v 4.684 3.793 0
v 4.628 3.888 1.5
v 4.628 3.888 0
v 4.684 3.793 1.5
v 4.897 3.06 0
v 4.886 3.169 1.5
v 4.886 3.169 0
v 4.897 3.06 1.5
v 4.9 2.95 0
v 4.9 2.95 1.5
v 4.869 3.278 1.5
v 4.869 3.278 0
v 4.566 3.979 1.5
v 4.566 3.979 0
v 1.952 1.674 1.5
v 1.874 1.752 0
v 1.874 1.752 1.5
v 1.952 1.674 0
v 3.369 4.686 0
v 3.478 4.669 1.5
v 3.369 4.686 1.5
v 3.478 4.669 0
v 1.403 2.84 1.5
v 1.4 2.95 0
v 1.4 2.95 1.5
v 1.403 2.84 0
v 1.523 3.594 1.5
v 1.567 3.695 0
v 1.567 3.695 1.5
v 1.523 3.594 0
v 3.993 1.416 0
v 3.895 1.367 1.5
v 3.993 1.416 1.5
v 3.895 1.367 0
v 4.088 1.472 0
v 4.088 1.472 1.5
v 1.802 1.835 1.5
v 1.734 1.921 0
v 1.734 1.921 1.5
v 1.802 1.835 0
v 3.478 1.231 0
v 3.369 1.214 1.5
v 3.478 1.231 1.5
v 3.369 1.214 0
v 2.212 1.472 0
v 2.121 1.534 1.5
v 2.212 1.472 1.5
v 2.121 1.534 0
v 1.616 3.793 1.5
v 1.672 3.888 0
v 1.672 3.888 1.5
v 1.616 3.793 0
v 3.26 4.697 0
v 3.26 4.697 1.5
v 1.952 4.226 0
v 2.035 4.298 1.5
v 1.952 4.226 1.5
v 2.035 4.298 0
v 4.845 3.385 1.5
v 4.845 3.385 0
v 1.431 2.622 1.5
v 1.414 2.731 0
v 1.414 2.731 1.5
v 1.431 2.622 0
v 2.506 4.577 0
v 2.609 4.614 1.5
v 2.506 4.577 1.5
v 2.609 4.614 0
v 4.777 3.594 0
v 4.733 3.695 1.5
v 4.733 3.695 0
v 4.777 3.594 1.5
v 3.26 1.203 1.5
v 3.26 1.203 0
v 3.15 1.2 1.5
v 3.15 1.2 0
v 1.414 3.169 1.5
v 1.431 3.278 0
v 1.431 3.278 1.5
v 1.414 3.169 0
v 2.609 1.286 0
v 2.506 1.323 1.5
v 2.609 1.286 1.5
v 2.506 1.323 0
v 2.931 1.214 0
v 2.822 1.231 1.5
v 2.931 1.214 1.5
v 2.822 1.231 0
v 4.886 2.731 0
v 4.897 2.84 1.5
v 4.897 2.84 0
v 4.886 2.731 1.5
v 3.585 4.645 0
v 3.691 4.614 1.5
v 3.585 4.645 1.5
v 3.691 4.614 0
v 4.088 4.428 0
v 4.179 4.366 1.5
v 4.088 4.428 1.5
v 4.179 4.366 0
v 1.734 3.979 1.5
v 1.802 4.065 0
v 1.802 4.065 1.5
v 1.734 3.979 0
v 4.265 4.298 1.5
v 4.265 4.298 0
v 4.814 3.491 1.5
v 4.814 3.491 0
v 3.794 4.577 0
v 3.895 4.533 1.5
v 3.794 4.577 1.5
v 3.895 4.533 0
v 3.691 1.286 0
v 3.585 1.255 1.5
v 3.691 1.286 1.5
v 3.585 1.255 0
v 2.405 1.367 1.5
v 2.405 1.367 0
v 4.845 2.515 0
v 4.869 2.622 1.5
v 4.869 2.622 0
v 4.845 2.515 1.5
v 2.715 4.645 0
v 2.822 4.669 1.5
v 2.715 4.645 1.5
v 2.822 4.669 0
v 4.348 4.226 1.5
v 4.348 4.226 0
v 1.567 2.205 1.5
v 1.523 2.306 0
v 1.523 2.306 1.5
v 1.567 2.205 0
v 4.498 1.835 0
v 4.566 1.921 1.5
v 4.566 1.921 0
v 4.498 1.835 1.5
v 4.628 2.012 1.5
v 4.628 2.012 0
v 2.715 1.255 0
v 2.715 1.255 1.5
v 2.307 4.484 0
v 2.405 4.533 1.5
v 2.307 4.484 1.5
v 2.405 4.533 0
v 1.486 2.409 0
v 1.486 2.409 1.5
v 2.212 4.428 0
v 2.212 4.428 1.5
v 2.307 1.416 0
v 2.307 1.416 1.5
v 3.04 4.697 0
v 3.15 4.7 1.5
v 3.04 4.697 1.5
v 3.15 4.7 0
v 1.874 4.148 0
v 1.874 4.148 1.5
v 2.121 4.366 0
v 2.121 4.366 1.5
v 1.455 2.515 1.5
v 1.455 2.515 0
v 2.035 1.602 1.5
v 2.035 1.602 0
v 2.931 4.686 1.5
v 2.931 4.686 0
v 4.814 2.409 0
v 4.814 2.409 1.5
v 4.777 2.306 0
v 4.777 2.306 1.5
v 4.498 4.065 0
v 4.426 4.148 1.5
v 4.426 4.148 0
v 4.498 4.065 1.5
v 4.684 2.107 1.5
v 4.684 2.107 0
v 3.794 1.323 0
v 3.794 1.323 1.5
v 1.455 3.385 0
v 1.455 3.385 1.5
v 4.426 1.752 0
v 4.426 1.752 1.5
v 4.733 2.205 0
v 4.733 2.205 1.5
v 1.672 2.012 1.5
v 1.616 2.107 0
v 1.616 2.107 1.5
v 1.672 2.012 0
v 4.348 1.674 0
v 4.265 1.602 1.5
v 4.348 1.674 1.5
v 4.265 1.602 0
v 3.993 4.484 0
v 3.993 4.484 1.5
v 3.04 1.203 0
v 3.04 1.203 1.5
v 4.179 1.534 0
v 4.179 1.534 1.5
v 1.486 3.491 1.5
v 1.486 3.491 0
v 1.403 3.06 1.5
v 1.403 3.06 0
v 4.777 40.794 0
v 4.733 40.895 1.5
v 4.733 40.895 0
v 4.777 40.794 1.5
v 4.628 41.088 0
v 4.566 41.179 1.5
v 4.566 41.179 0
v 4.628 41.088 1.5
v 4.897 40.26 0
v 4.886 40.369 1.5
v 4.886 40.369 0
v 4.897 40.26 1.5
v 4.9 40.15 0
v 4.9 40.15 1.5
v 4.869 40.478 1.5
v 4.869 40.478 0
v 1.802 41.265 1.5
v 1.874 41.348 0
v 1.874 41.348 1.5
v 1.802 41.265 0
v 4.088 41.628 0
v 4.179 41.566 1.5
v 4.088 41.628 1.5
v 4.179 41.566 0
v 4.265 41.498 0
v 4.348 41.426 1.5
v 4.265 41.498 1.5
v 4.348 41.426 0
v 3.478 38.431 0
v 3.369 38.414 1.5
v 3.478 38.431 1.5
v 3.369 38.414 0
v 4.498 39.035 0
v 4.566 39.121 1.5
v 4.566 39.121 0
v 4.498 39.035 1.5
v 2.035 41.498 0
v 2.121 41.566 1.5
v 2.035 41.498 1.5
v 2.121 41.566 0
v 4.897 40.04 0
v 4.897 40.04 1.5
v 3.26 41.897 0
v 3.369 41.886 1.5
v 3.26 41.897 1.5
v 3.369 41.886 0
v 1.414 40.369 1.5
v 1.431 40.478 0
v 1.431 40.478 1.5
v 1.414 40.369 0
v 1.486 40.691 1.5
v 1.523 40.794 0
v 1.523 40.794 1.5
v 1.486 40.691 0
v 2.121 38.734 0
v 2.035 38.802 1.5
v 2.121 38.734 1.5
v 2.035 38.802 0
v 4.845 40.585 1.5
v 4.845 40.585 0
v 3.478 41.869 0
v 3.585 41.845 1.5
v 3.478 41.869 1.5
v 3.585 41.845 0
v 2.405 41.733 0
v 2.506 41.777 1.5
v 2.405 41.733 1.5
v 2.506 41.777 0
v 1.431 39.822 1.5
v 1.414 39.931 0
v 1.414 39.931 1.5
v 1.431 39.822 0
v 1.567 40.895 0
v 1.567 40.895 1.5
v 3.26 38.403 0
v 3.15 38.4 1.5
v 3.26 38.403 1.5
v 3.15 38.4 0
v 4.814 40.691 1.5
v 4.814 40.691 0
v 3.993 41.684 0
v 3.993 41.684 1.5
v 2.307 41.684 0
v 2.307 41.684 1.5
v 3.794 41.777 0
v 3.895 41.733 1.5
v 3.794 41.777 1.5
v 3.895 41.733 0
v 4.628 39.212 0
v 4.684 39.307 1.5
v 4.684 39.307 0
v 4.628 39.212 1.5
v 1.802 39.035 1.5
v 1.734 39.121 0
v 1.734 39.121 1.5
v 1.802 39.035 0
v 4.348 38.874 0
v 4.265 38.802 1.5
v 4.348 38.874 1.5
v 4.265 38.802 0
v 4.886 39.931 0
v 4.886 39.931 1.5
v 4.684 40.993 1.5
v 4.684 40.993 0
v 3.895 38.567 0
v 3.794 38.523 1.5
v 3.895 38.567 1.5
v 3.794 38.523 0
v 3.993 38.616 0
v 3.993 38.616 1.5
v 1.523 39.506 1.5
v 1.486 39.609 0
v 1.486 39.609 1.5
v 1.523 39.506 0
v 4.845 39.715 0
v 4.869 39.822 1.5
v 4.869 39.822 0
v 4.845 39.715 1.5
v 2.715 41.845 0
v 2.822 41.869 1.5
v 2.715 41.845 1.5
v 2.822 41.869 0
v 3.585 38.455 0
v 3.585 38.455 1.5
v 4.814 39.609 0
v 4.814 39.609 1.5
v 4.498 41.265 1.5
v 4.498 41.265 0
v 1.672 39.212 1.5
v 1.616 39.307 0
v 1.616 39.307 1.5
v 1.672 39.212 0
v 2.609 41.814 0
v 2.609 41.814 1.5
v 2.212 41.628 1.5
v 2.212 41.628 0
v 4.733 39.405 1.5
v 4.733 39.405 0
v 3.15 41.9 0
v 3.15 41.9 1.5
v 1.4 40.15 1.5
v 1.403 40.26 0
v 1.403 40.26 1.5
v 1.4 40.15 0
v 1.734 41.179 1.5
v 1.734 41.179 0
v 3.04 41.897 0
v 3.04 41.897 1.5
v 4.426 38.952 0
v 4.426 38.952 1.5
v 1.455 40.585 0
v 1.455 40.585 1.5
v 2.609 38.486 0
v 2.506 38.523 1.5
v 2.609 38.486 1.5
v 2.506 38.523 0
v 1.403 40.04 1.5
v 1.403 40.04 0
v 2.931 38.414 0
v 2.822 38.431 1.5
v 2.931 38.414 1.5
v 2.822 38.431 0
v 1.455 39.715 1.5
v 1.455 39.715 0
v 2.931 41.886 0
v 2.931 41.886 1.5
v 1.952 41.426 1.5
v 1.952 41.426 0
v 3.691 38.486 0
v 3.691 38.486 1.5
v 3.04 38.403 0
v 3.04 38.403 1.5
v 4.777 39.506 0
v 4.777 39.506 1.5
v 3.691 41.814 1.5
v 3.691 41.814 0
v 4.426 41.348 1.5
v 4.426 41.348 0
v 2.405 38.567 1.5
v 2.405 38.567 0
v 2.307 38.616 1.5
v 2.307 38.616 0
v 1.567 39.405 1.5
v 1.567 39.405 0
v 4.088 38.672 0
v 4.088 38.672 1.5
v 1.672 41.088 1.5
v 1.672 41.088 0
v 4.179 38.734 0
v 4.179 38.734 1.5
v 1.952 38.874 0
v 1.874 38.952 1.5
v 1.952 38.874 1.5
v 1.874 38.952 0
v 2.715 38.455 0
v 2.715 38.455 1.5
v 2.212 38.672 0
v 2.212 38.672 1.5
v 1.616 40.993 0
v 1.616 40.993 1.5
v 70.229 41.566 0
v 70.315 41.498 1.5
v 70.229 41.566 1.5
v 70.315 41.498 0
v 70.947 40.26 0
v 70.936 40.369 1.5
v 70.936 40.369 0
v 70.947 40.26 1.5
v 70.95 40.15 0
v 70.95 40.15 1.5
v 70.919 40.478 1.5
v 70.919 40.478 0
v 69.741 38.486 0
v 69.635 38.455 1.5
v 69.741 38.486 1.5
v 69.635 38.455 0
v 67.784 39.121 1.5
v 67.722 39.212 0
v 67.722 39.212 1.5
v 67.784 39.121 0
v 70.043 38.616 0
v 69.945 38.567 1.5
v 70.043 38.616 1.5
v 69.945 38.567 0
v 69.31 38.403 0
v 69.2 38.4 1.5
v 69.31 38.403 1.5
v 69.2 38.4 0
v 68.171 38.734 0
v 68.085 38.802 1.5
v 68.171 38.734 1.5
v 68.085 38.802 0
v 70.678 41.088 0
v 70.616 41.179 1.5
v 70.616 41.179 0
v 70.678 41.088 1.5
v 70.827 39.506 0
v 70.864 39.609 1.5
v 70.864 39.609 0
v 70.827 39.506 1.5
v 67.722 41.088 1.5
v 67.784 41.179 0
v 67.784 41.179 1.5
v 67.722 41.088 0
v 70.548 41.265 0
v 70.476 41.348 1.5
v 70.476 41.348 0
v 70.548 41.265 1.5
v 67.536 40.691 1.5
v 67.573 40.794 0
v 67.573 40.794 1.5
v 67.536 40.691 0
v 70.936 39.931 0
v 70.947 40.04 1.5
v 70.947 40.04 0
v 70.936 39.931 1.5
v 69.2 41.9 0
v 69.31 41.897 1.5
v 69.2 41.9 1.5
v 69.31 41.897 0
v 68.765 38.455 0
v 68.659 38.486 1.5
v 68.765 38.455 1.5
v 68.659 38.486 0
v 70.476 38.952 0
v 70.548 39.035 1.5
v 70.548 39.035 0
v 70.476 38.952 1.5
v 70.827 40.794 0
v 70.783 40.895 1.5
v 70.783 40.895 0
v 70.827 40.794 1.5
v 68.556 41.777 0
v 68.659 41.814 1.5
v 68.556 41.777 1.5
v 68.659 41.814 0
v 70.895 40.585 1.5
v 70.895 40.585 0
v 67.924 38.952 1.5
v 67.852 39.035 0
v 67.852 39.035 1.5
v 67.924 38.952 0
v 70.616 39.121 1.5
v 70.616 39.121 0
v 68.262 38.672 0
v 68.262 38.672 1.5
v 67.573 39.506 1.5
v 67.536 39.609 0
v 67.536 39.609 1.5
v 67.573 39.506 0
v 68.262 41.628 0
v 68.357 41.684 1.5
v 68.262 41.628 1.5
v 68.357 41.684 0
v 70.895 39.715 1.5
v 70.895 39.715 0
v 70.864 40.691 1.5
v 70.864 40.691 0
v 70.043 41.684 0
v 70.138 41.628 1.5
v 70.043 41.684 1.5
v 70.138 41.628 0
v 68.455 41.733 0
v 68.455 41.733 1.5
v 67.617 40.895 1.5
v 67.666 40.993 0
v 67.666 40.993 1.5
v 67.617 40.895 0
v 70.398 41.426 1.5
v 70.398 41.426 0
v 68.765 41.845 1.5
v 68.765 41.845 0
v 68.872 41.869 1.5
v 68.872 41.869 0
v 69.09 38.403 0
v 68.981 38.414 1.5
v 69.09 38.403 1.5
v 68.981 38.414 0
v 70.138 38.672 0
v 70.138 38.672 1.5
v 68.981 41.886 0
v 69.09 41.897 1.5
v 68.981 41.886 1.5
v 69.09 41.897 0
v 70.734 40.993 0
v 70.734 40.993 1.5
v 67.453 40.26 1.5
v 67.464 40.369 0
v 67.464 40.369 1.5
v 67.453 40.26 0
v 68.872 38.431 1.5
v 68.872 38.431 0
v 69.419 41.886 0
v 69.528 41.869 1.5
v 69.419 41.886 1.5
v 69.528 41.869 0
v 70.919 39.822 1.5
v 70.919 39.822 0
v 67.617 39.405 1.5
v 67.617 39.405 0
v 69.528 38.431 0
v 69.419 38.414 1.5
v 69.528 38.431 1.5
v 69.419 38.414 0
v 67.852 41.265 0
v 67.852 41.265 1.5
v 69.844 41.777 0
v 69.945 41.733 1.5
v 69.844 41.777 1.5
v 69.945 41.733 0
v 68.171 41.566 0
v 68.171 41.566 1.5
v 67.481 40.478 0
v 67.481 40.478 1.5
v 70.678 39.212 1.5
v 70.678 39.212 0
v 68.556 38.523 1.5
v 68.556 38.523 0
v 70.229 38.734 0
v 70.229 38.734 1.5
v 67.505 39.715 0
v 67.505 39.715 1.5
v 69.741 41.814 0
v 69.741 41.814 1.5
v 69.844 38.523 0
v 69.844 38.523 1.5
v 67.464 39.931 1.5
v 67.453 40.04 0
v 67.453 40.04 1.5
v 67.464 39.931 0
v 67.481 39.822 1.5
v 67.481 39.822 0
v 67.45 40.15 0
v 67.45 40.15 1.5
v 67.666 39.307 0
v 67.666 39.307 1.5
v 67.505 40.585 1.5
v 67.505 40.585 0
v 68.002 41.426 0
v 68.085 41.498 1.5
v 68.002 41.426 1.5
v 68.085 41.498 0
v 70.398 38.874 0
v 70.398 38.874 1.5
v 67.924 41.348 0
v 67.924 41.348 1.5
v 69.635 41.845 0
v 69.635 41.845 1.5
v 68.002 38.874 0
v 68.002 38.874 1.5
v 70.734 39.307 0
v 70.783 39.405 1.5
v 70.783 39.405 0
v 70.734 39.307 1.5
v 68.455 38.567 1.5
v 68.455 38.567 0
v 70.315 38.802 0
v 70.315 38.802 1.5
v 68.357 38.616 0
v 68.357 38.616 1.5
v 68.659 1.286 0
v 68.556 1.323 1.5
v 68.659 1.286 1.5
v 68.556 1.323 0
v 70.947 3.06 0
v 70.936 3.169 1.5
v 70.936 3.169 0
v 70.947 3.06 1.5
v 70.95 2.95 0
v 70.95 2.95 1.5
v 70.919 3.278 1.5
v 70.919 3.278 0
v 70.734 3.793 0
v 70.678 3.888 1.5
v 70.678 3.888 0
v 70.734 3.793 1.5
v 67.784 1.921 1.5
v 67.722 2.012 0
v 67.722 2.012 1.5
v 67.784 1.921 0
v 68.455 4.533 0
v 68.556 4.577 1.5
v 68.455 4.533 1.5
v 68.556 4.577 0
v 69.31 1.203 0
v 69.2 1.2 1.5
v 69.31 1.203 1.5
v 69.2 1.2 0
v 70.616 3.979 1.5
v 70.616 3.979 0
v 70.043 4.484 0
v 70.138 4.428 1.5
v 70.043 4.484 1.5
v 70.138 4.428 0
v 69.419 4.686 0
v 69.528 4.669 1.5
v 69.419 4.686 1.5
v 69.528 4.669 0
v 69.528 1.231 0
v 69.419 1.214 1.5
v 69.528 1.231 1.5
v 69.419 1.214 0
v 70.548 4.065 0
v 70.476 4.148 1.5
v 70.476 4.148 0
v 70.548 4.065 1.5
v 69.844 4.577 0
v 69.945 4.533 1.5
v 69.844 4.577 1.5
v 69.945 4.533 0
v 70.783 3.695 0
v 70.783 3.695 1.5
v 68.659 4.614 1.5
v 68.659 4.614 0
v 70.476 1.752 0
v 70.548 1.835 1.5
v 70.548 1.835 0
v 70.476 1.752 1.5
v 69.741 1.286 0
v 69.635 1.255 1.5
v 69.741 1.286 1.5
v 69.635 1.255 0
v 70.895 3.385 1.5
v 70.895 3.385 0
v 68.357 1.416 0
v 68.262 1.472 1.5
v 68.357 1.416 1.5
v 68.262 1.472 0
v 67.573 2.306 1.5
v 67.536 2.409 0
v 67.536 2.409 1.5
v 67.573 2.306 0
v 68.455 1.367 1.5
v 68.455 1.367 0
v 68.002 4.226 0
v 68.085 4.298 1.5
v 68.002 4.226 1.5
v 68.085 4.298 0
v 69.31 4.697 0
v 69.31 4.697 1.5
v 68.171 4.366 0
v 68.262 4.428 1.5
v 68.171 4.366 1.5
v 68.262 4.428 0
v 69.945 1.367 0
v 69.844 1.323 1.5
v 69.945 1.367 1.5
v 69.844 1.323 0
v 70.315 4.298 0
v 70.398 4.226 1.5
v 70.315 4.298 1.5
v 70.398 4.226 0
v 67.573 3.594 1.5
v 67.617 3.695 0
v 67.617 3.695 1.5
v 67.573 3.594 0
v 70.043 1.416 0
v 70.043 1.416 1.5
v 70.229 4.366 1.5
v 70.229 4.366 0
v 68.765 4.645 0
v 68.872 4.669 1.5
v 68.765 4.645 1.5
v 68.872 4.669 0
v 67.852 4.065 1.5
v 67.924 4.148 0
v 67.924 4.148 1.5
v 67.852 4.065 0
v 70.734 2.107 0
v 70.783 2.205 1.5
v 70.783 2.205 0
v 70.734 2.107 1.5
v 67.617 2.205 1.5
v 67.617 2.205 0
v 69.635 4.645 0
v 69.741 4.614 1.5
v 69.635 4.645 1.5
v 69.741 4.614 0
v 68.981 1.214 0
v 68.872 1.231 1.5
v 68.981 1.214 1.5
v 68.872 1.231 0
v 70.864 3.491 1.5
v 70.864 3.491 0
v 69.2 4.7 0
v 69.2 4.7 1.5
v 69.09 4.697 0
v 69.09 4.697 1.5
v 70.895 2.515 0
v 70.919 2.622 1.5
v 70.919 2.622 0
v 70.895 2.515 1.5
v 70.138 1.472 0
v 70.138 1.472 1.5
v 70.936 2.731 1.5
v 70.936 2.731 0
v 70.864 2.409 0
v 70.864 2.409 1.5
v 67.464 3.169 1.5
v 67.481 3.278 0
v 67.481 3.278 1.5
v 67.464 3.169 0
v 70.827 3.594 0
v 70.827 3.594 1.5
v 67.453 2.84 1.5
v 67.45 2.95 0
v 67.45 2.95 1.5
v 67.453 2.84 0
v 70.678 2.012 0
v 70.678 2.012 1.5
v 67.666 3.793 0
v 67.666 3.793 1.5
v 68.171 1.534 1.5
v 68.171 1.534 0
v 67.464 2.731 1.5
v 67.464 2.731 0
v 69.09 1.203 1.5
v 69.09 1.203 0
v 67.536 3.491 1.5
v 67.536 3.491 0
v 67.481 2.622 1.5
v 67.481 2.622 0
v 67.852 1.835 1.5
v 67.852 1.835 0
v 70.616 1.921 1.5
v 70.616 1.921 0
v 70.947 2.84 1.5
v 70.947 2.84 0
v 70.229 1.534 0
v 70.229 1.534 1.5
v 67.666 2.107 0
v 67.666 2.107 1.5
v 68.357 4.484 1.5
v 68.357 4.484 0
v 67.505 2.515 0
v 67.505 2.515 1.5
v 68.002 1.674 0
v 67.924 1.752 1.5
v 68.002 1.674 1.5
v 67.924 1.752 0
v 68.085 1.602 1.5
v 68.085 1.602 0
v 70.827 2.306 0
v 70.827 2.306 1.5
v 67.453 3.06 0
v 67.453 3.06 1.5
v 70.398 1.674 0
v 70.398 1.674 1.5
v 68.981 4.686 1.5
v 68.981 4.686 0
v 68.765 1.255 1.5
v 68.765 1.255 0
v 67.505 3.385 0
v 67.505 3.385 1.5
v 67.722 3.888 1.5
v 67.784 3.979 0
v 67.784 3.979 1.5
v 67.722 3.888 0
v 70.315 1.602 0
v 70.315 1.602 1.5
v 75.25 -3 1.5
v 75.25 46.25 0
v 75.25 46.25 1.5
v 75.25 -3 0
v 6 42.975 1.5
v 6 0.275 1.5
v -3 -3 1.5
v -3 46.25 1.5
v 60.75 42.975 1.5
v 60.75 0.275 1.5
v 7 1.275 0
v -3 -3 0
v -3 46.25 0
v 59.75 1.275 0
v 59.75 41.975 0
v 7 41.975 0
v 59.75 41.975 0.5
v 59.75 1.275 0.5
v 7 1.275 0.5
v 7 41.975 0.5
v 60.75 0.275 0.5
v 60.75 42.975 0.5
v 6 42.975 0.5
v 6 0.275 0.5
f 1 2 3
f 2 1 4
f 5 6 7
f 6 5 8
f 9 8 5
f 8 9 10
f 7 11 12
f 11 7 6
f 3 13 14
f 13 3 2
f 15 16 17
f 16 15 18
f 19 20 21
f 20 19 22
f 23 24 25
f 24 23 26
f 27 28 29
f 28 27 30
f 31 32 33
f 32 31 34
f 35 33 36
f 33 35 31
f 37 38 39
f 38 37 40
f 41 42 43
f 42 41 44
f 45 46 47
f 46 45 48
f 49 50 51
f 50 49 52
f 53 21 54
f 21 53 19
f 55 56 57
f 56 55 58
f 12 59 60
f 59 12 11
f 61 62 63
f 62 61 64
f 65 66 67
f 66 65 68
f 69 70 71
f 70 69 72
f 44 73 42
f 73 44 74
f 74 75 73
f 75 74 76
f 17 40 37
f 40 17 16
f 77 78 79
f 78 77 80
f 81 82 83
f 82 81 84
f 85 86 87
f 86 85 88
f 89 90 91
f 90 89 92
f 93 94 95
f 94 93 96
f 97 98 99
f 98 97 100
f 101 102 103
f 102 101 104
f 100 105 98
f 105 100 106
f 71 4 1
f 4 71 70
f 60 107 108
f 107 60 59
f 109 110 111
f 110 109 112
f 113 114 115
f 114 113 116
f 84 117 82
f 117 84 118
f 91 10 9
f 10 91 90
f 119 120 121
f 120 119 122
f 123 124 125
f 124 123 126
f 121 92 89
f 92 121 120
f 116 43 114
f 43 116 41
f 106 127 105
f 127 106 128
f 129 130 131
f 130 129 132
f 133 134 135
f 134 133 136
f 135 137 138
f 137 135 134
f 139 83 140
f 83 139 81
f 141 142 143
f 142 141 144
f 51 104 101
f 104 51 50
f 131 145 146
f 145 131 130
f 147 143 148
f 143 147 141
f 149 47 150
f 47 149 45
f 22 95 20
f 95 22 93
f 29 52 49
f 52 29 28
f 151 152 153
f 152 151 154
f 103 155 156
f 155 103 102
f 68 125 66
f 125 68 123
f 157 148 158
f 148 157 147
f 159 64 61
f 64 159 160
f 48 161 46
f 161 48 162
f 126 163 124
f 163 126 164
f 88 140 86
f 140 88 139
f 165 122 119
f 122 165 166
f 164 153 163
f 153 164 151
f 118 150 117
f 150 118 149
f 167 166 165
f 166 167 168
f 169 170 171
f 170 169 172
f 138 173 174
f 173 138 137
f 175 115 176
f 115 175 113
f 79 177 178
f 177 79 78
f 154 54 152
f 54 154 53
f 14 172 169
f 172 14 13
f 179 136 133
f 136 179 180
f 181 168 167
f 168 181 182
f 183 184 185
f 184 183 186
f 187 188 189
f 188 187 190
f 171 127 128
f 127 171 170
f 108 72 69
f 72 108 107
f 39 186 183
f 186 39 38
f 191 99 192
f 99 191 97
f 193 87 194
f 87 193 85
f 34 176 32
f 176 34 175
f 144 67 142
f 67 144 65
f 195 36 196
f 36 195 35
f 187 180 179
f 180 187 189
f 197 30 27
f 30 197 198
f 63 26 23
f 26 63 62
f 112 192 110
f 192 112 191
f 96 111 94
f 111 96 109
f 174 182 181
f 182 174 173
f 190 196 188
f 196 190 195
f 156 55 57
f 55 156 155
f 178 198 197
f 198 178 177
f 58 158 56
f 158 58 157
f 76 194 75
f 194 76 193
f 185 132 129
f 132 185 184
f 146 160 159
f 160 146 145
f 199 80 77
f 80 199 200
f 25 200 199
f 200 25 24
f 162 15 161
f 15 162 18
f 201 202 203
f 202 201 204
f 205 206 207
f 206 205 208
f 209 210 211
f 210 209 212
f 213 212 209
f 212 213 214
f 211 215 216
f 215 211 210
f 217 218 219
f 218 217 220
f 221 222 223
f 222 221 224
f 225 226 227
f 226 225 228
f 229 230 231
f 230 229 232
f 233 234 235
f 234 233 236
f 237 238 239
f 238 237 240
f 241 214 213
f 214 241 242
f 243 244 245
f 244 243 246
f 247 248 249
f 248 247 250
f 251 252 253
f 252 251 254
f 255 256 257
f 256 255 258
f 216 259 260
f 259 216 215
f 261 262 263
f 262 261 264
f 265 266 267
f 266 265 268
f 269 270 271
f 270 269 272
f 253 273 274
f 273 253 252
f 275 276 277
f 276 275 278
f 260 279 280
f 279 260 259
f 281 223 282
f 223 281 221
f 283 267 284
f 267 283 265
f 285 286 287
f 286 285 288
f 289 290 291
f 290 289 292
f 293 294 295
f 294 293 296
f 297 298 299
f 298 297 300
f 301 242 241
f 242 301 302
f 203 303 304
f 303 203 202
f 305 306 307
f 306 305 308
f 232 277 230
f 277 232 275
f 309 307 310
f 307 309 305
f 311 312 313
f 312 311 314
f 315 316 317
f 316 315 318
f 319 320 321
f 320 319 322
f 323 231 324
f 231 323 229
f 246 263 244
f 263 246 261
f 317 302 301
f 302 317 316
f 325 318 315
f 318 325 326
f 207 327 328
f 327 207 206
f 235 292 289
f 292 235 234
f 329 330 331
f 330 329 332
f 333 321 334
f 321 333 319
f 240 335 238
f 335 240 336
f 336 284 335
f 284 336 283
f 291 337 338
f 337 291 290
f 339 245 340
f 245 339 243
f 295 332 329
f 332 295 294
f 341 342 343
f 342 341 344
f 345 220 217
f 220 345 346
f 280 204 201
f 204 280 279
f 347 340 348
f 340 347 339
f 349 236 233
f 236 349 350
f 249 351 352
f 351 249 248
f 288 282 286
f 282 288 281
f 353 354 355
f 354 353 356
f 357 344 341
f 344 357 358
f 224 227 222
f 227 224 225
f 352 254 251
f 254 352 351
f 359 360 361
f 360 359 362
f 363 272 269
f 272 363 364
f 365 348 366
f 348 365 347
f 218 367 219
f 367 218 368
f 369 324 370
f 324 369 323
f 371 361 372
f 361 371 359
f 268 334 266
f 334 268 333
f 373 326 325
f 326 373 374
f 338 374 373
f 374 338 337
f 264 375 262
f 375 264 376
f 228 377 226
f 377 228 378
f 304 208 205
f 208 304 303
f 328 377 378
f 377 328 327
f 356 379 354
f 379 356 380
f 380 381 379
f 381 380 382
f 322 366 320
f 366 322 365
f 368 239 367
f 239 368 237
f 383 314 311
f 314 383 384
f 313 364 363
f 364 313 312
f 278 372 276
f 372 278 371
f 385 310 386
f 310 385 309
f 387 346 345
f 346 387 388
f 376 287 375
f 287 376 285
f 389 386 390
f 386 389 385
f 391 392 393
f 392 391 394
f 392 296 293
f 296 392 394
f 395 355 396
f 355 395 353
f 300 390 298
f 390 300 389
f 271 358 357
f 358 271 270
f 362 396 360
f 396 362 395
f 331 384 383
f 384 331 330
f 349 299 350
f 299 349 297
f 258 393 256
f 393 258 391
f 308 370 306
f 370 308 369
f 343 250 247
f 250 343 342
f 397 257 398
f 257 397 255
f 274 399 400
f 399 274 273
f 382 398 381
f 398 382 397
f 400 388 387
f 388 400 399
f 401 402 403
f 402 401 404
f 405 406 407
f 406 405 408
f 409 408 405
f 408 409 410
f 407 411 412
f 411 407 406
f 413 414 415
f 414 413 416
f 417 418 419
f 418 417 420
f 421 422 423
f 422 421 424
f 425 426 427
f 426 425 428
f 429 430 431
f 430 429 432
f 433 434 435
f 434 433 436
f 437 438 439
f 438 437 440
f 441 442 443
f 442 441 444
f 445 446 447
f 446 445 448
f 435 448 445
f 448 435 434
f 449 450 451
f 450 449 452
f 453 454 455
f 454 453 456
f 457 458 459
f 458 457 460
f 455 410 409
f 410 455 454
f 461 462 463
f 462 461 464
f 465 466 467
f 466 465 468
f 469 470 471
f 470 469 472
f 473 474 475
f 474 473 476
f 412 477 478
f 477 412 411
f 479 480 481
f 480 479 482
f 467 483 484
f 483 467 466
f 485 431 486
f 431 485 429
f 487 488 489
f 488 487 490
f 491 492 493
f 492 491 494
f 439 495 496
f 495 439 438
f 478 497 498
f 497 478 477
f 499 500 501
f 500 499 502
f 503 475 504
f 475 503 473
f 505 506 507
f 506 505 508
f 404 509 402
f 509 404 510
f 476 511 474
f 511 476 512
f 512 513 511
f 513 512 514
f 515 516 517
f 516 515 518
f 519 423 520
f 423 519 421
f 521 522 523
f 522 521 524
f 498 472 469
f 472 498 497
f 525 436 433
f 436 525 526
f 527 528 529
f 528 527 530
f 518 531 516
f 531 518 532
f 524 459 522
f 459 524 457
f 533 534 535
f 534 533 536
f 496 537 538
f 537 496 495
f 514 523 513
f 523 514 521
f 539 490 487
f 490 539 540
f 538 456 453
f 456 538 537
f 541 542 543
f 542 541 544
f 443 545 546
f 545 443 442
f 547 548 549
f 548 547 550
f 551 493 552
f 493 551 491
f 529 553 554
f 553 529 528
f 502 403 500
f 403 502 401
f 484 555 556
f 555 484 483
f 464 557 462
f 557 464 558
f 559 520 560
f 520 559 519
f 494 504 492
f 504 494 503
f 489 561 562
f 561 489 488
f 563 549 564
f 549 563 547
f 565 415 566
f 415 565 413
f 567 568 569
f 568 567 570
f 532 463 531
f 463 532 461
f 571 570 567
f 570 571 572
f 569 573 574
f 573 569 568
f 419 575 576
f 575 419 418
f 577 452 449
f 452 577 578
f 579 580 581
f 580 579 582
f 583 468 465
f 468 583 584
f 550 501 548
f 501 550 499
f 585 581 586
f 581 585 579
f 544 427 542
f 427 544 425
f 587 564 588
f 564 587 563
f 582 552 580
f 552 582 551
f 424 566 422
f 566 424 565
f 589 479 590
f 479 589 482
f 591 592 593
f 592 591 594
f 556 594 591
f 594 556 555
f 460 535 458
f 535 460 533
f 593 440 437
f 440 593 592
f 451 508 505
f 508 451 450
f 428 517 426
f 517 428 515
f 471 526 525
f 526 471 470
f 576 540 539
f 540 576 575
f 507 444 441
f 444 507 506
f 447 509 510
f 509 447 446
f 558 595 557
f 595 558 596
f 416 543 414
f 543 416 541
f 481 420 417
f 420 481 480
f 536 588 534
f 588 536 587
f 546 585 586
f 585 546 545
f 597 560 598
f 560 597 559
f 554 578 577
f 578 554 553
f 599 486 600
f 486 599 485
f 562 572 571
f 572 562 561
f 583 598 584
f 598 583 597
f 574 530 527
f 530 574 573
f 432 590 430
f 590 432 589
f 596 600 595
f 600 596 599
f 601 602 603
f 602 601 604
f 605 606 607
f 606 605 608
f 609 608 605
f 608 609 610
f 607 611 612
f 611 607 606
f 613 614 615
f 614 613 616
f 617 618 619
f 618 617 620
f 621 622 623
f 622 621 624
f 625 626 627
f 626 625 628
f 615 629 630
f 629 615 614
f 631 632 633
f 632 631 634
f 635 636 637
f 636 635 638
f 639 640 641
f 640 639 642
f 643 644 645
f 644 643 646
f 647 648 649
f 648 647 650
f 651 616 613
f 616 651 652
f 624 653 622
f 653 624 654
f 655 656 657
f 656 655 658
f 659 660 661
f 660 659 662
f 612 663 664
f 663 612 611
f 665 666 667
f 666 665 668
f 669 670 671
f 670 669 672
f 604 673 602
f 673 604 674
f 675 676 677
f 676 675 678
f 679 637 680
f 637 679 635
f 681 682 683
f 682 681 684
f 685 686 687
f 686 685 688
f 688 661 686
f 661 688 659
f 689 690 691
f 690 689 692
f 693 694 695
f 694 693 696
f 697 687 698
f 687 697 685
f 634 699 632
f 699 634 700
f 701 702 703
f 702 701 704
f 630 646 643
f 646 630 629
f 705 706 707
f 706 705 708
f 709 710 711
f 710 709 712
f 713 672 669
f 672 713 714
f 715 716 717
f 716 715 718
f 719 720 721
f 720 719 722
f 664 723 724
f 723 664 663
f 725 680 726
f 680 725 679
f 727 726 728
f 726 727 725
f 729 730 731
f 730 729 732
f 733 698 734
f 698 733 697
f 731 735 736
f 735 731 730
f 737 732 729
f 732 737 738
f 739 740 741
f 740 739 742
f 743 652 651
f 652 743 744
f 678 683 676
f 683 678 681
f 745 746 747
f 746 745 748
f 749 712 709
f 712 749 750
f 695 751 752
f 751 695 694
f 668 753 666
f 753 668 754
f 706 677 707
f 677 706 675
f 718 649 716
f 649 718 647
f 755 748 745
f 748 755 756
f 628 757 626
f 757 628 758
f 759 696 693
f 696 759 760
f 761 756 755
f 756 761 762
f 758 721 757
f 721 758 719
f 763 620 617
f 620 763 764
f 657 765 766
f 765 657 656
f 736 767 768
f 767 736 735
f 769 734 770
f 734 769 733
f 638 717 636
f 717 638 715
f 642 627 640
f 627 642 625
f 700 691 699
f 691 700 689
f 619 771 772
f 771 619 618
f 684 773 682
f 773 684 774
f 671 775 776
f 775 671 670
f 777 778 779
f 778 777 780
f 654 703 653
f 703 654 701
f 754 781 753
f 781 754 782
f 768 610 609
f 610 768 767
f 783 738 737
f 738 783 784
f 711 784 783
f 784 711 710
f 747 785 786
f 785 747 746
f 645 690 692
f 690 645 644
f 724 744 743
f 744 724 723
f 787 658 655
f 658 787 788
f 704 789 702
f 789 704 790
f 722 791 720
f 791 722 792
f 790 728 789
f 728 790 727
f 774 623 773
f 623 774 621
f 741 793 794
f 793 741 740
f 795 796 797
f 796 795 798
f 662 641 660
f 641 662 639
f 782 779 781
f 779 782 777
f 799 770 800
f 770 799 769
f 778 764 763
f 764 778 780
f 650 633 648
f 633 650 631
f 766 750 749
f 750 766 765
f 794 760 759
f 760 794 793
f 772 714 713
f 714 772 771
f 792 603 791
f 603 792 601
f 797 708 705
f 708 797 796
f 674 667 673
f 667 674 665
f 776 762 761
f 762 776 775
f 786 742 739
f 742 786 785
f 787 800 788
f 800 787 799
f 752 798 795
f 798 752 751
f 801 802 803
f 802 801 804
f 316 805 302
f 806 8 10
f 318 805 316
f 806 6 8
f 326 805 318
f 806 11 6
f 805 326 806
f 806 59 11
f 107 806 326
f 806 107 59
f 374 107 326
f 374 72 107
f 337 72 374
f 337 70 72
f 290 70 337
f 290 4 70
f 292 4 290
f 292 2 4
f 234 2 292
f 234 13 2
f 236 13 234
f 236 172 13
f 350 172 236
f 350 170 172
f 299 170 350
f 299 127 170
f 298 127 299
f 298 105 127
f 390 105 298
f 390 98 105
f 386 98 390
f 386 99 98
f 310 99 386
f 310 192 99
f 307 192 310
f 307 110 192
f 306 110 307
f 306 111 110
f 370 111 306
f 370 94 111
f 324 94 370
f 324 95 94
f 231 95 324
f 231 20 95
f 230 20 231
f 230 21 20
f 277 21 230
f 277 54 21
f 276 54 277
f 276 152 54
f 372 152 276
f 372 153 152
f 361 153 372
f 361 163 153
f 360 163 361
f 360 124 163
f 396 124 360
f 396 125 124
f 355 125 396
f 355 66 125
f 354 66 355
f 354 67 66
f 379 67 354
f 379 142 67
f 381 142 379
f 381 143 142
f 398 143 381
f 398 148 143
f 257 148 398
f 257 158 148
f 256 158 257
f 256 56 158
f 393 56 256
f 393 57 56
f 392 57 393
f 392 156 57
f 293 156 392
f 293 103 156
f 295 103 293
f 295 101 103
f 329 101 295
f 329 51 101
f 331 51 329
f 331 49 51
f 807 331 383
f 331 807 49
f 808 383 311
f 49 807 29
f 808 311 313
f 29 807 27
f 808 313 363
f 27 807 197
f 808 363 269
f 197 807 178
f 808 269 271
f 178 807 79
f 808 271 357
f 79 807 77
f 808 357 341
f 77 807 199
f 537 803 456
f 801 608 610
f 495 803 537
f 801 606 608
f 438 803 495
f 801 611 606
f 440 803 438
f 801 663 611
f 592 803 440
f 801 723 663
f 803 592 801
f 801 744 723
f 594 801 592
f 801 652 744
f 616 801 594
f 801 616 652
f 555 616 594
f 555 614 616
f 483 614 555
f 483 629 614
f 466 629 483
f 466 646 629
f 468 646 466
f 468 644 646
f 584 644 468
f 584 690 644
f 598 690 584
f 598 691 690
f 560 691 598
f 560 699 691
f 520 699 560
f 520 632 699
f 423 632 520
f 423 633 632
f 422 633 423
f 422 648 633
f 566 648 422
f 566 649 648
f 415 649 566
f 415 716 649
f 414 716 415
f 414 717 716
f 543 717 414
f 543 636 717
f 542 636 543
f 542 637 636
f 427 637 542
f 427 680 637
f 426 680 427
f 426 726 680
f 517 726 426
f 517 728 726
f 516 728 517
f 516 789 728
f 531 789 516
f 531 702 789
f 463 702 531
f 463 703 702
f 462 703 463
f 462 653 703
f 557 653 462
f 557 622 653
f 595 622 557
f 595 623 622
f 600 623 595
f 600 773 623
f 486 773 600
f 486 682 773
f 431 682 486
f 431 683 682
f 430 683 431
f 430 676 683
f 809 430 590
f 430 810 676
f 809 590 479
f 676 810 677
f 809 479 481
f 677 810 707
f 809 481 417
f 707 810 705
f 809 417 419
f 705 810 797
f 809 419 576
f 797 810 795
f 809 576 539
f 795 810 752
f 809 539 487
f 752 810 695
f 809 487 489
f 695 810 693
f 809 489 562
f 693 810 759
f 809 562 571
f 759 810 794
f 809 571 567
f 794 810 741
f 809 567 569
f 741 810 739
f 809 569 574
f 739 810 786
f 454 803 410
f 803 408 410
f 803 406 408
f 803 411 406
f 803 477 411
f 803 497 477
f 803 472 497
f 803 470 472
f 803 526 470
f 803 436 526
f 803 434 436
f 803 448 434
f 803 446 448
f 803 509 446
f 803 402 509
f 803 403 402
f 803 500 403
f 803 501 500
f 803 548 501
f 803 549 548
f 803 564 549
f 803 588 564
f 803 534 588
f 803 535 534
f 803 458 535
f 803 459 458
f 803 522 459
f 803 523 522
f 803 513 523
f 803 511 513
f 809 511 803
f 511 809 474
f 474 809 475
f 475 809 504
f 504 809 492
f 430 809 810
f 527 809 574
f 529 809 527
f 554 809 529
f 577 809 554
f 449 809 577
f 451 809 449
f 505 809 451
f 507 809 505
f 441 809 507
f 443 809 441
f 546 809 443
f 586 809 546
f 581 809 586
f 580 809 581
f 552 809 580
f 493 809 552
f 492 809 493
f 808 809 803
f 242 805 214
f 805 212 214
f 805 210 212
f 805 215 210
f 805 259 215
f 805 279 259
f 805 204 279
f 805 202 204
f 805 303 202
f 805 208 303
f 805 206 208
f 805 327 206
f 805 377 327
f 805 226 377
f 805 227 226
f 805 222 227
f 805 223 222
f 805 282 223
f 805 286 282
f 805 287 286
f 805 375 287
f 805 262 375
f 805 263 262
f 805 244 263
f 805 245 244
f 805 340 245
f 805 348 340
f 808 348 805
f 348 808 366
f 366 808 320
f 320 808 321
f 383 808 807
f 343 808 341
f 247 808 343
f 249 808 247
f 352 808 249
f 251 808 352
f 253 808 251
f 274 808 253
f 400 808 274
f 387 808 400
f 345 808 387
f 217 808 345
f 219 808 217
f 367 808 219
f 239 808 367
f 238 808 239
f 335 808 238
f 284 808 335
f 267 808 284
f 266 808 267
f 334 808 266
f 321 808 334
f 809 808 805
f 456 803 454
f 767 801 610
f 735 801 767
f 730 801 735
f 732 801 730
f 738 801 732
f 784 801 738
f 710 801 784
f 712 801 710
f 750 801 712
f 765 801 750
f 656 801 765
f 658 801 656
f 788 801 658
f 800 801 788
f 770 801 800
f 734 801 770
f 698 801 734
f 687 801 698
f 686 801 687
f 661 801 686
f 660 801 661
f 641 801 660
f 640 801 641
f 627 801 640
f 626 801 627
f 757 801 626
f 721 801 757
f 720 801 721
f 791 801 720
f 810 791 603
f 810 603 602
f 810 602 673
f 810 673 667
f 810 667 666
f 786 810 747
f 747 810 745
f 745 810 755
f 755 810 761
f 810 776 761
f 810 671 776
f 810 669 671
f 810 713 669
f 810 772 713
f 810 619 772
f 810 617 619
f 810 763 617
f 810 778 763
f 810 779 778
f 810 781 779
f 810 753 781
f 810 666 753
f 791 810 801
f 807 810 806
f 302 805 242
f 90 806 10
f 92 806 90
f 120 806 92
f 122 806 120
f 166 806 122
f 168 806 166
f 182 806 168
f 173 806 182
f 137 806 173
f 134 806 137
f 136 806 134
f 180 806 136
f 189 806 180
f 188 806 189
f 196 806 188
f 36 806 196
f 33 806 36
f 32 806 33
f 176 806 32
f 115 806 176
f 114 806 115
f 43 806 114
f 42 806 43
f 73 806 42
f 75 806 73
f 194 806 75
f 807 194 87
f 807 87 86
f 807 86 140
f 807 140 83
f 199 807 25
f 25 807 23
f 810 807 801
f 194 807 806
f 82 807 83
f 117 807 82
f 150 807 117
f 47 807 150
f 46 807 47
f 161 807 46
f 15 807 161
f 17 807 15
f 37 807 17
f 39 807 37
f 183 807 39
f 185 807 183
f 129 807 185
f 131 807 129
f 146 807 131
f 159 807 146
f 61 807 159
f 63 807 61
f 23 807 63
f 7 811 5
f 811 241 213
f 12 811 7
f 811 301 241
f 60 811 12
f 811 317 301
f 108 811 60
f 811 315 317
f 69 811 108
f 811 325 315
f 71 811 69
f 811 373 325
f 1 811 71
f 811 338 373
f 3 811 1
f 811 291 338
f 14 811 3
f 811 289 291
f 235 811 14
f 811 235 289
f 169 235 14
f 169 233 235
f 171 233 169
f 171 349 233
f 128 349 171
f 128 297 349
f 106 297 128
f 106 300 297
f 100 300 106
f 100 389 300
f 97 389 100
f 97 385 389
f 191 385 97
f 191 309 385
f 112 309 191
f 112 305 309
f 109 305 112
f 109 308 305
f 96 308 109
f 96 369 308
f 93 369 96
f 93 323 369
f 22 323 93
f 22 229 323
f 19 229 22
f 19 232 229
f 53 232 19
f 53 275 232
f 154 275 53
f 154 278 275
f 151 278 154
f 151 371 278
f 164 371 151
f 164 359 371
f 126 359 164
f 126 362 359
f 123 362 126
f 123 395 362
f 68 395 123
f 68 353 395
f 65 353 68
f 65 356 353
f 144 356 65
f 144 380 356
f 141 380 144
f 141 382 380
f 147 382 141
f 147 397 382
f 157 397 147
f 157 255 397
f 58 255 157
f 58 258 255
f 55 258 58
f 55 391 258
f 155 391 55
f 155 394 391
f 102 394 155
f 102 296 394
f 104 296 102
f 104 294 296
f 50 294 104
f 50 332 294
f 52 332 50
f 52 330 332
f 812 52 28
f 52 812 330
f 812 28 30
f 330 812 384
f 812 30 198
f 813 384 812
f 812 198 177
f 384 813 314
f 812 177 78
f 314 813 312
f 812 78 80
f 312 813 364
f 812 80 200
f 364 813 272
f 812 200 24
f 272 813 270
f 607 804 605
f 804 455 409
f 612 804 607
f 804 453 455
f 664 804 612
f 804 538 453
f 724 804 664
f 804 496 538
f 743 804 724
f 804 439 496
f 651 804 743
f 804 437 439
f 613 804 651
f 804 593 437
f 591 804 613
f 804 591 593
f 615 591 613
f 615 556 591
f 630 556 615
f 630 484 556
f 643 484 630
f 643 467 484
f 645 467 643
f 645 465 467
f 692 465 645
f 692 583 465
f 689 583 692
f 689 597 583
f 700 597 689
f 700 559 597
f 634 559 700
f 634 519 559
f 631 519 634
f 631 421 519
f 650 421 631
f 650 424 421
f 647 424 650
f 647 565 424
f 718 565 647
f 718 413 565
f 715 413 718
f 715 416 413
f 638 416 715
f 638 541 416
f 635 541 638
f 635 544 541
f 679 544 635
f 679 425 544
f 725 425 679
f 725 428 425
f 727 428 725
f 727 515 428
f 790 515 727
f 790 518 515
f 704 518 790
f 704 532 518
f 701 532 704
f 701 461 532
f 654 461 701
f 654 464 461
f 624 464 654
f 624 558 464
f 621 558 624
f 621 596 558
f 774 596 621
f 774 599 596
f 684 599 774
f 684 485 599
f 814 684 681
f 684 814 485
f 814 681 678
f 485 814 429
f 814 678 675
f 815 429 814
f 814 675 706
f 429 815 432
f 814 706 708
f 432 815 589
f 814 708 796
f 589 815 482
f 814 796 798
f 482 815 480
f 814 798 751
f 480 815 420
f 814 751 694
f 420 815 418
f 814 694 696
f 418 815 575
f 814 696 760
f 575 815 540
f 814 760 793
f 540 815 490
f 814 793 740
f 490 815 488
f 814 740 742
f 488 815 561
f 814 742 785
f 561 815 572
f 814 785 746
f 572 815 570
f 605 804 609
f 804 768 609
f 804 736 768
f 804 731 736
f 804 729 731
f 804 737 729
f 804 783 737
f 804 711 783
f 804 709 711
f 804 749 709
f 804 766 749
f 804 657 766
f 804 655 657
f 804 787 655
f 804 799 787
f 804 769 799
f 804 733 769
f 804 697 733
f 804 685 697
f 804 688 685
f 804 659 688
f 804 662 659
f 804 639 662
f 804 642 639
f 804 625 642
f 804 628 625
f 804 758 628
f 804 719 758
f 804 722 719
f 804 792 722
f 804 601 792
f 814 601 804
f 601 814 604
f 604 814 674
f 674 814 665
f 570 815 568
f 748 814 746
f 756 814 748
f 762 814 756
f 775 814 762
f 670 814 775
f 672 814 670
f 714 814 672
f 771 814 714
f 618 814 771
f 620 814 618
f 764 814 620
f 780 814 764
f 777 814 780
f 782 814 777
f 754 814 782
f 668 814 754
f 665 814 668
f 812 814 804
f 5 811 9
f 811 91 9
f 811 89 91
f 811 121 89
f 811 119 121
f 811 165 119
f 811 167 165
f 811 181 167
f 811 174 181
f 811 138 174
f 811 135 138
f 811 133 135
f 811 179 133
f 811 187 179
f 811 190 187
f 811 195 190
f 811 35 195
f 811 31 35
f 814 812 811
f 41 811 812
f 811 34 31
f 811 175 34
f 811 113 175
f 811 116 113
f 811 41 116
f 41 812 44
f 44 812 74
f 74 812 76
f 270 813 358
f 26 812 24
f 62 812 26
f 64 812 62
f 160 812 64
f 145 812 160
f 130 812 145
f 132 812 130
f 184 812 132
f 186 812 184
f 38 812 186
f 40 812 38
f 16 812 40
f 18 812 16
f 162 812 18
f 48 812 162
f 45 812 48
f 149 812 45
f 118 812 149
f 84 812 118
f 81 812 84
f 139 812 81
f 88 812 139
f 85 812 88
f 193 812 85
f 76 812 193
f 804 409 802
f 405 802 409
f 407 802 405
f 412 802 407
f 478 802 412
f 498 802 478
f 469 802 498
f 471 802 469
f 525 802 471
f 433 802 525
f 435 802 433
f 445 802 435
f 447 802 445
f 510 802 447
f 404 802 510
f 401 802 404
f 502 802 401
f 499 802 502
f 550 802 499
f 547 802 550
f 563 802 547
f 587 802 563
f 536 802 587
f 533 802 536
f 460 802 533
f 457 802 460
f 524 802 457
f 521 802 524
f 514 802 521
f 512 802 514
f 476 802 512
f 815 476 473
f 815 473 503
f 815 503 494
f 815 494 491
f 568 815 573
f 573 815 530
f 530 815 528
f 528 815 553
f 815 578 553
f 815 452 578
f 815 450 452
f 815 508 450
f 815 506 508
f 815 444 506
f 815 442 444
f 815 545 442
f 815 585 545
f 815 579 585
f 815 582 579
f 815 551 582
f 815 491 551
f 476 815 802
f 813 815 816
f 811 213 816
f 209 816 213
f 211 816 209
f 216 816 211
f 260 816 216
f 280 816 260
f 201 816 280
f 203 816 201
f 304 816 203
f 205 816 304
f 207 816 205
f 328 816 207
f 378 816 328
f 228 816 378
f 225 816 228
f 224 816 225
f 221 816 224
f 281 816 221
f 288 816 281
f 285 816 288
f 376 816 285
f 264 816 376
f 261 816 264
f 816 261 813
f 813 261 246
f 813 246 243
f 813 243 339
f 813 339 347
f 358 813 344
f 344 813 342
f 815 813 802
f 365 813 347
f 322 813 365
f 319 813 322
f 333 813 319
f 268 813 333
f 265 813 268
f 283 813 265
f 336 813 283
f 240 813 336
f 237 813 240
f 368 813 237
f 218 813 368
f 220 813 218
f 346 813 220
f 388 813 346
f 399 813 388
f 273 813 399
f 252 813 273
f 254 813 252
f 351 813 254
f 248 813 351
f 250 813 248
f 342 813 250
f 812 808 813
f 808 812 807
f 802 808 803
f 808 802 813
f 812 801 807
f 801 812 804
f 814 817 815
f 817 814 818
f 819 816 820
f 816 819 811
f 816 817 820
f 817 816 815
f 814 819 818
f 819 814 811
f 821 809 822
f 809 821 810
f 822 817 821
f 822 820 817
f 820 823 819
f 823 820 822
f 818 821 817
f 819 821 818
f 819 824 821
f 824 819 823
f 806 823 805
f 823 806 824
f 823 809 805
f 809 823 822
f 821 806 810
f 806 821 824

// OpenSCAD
// file: ../libraries/commons.scad
/**
 * forEachCoord
 * Wrapper to apply child on each element
 */
module forEachCoord(coords_list) {
    for (coords = coords_list)
        translate(
            [
                coords[0] == undef ? 0 : coords[0],
                coords[1] == undef ? 0 : coords[1],
                coords[2] == undef ? 0 : coords[2],
            ]
        )
            children();
}
// file: ../enveloppes/screenEnveloppe.scad
include <../assets/lcd-screen/configurations.scad>

use <../libraries/commons.scad>

/**
 * screenFixationThrows
 * @name screenFixationThrows
 * @description screenFixationThrows
 * @type enveloppe
 * @parent root
 */
module screenFixationThrows(
    electronic_board_x_size = screen_asset_electronic_board_x_size,
    electronic_board_y_size = screen_asset_electronic_board_y_size,
    x_margin_left = screen_asset_x_margin_throws_left,
    x_margin_right = screen_asset_x_margin_throws_right,
    y_margin_top = screen_asset_y_margin_throws_top,
    y_margin_bottom = screen_asset_y_margin_throws_bottom,
    throw_diameter = 3.1,
    $fn = $fn
) {

    throws_z_size = 20;

    offset_coords_throw_list = [
        [
            x_margin_left,
            y_margin_bottom,
        ],
        [
            x_margin_left,
            electronic_board_y_size - y_margin_top,
        ],
        [
            electronic_board_x_size - x_margin_right,
            electronic_board_y_size - y_margin_top,
        ],
        [
            electronic_board_x_size - x_margin_right,
            y_margin_bottom,
        ]
    ];

    // Fixations throws
    translate([0,0, -throws_z_size / 2])
        forEachCoord(offset_coords_throw_list)
            cylinder(h = throws_z_size, d = throw_diameter, center = false, $fn = $fn);
}


/**
 * screenMainThrow
 * @name screenMainThrow
 * @description screenMainThrow
 * @type enveloppe
 * @parent root
 */
module screenMainThrow(
    electronic_board_x_size = screen_asset_electronic_board_x_size,
    electronic_board_y_size = screen_asset_electronic_board_y_size,
    screen_external_x_size = screen_asset_screen_external_x_size,
    screen_external_y_size = screen_asset_screen_external_y_size,
    screen_throw_x_margin = 2.8,
    screen_throw_y_margin = 0.5
) {

    throws_z_size = 20;

    // Main screen throw
    translate([
        (electronic_board_x_size - screen_external_x_size) / 2 - screen_throw_x_margin,
        (electronic_board_y_size - screen_external_y_size) / 2 - screen_throw_y_margin,
        -throws_z_size / 2
    ])
        cube(
            [
                screen_external_x_size + (screen_throw_x_margin * 2),
                screen_external_y_size + (screen_throw_y_margin * 2),
                throws_z_size,
            ]
        );
}

/**
 * screenConnectorThrow
 * @name screenConnectorThrow
 * @description screenConnectorThrow
 * @type enveloppe
 * @parent root
 */
module screenConnectorThrow(
    electronic_board_y_size = screen_asset_electronic_board_y_size
) {
    throws_z_size = 20;

    translate(
        [
            0.85 - (0.5 / 2),
            11.3,
            -throws_z_size / 2
        ]
    )
        cube(
            [
                2.5 + 0.5,
                electronic_board_y_size - (11.3 * 2),
                throws_z_size
            ]
        );
}

/**
 * sceenVisibleZoneCube
 * @name sceenVisibleZoneCube
 * @description sceenVisibleZoneCube
 * @type enveloppe
 * @parent root
 */
module sceenVisibleZoneCube(
    x_margin = 0,
    y_margin = 0,
    z_size = 0,

    electronic_board_x_size = screen_asset_electronic_board_x_size,
    electronic_board_y_size = screen_asset_electronic_board_y_size,
    screen_external_x_size = screen_asset_screen_external_x_size,
    screen_external_y_size = screen_asset_screen_external_y_size,
) {

    translate([
        (electronic_board_x_size - screen_external_x_size) / 2 + 1 - x_margin,
        (electronic_board_y_size - screen_external_y_size) / 2 + 1 - y_margin,
        0
    ])
        cube(
            [
                screen_external_x_size - 1 - 6.5 + (x_margin * 2),
                screen_external_y_size - 1 - 1 + (y_margin * 2),
                z_size,
            ]
        );
}

sceenVisibleZoneCube();
// file: ../configurations/global.scad
housing_facades_throws_diameter = 3.8;

// external size
case_external_x_size = 90;
case_external_y_size = 140;
case_external_z_size = 38;
case_external_panes_thickness = 4.8;

facade_front_round_edges_radius = 5;
facade_throws_margin = 5;

facade_front_fixation_throws_diameter = housing_facades_throws_diameter;

// facade corners
facade_corners_offset_lenght = 9;
facade_corners_main_x_size = 19;
facade_corners_main_y_size = 19;
facade_corners_main_thickness = 11;
facade_corners_correction_offset_length = 0.2;
facade_corners_correction_offset_thickness = 0.0;
facade_fn = 100;


facade_controller_coords = [
    case_external_x_size / 2,
    case_external_y_size / 2 - 30,
];


// Screen frames
screen_frame_electronic_board_margin = 3;
screen_frame_throw_diameter = 3.5;
screen_frame_piece_z_size = 1.5;
screen_frame_piece_glass_embedding_margin = 1;
screen_frame_piece_glass_embedding_z_depth = 1;
screen_frame_facade_piece_z_size = 1;
screen_frame_fn = 100;

screen_glass_visible_zone_x_margin = 0.7;
screen_glass_visible_zone_y_margin = 0.7;
screen_glass_z_size = 1;

facade_screen_coords = [
    case_external_x_size / 2,
    case_external_y_size / 2 + 28,
];


// Generics
insert_throw_diameter = 4.2;
insert_throw_length = 6 + 2;


// Controller facade
controller_breadboard_x_size_point = 28;
controller_breadboard_y_size_point = 9;

controller_facade_z_size = 2;
controller_facade_button_throw_margin = 1;
controller_facade_small_button_throw_margin = 0.5;
controller_facade_a_b_button_throw_margin = 0.5;

controller_facade_border_rounded_border_1 = 5;
controller_facade_border_rounded_border_2 = 4;

controller_facade_with_border_x_size = 82;
controller_facade_with_border_y_size = 47;

controller_facade_border_throws_margin = 5;
controller_braidboard_throw_margin = 1;

controller_facade_border_fn = 80;


// Cross Button
controller_cross_button_x_y_size = 20;
controller_cross_button_z_size = 4;
controller_cross_button_thickness = 6;
controller_cross_button_round_edges_radius = 1;
controller_cross_button_support_x_y_size = 22;
controller_cross_button_support_z_size = 1;
controller_cross_button_fn = 150;


// A and B Buttons
controller_a_b_button_diameter = 7.5;
controller_a_b_button_z_size = 4;
controller_a_b_button_support_diameter = 9.5;
controller_a_b_button_support_z_size = 1;
controller_a_b_button_fn = 80;


// small Buttons
controller_small_button_diameter = 5.5;
controller_small_button_z_size = 3;
controller_small_button_support_diameter = 7.5;
controller_small_button_support_z_size = 1;
controller_small_button_fn = 80;

// Directional cross
controller_directional_cross_points_coords = [6, 5];
controller_start_button_points_coords = [14, 3];
controller_select_button_points_coords = [18, 3];
controller_menu_button_points_coords = [14, 7];
controller_option_button_points_coords = [18, 7];
controller_a_button_points_coords = [23, 4];
controller_b_button_points_coords = [27, 6];
controller_bolt_throws_list = [
    [2, 2],
    [2, 8],
    [10, 2],
    [10, 8],
    [27, 2],
    [23, 8],
];


// usb charger holder
usb_charger_support_total_x_size = 17.57 + 15;
usb_charger_support_total_y_size = 12;
usb_charger_support_total_z_size = 2;


usb_charger_fixation_support_z_size = 4.5;
usb_charger_encaps_x_size = 17.57 + 1;
usb_charger_encaps_y_size = 27.85 + 1;
usb_charger_encaps_z_size = 1;

usb_charger_facade_x_fixation_spacing = 42;
usb_charger_facade_y_size = 1.36;
usb_charger_facade_z_size = 14;

usb_charger_throw_diameter = 3.5;
usb_charger_facade_holder_z_offset = 3.5; //
usb_charger_fixation_facade_y_margin = 0.5;
usb_charger_throw_offset_y = 4.5;
usb_charger_throw_offset_x = 3.5;
usb_charger_facade_fn = 100;

usb_charger_external_facade_main_throw_margin = 2;
usb_charger_external_facade_main_throw_diameter = housing_facades_throws_diameter;

usb_charger_coords = [
    28, 15
];


facade_top_on_off_button_throw_diameter = 12.8;

facade_top_on_off_button_coords = [
    case_external_x_size / 2 + 18,
    case_external_z_size / 2
];


// Bolt join Piece Mother board
bolt_join_mother_board_internal_diameter = 3.5;
bolt_join_mother_board_external_diameter = 3.5 + (0.4 * 6);
bolt_join_mother_board_height = 3;

// Bolt join Piece GamePadController
bolt_join_game_pad_internal_diameter = 3.5;
bolt_join_game_pad_external_diameter = 3.5 + (0.4 * 6);
bolt_join_game_pad_height = 6.5;

bolt_join_fn = 500;


// Mother board breadboard
mother_board_x_size_point = 25;
mother_board_y_size_point = 32;

mother_board_coords = [
    case_external_x_size / 2 - ((mother_board_x_size_point + 1) * 2.54) / 2,
    44,
    3
];

mother_board_bolt_throws_list = [
    [3, 2],
    [3, 17],
    [23, 2],
    [23, 17],
];


// Speaker
speaker_facade_throw_diameter = 28 + 1;
speaker_facade_z_size = 1.36;
speaker_facade_rounded_radius = 5;
// file: ../assets/lcd-screen/configurations.scad
screen_asset_electronic_board_x_size = 72.25;
screen_asset_electronic_board_y_size = 43.25;
screen_asset_electronic_board_z_size = 1.25;

screen_asset_screen_external_x_size = 60.25;
screen_asset_screen_external_y_size = 42.7;
screen_asset_screen_external_z_size = 4 - 1.25;

screen_asset_throw_diameter = 3.1;

screen_asset_x_margin_throws_left = 1.6 + 1.55;
screen_asset_x_margin_throws_right = 1.5 + 1.55;
screen_asset_y_margin_throws_top = 1.55 + 1.55;
screen_asset_y_margin_throws_bottom = 1.4 + 1.55;
// main file
include <../assets/lcd-screen/configurations.scad>
include <../configurations/global.scad>

use <../enveloppes/screenEnveloppe.scad>

/**
 * screenFramePiece
 * @name screenFramePiece
 * @description Piece 3D printed
 * @type piece
 * @parent screenComponent
 */
module screenFramePiece(
    electronic_board_x_size = screen_asset_electronic_board_x_size,
    electronic_board_y_size = screen_asset_electronic_board_y_size,

    screen_frame_electronic_board_margin = screen_frame_electronic_board_margin,
    screen_frame_z_size = screen_frame_piece_z_size,
    glass_embedding_margin = screen_frame_piece_glass_embedding_margin,
    glass_embedding_z_depth = screen_frame_piece_glass_embedding_z_depth,

    throw_diameter = screen_frame_throw_diameter,

    $fn = screen_frame_fn
) {

    left_margin = screen_frame_electronic_board_margin;
    right_margin = screen_frame_electronic_board_margin;
    top_margin = screen_frame_electronic_board_margin;
    bottom_margin = screen_frame_electronic_board_margin;

    throws_z_size = 20;

    difference() {
        translate([-left_margin, -bottom_margin, 0])
            cube(
                [
                    electronic_board_x_size + left_margin + right_margin,
                    electronic_board_y_size + top_margin + bottom_margin,
                    screen_frame_z_size
                ]
            );

        translate([0,0, -throws_z_size / 2])
            sceenVisibleZoneCube(
                z_size = throws_z_size
            );


        // Embedding glass
        translate([0,0, screen_frame_z_size - glass_embedding_z_depth])
            sceenVisibleZoneCube(
                x_margin = glass_embedding_margin,
                y_margin = glass_embedding_margin,
                z_size = glass_embedding_z_depth + 0.01
            );

        screenFixationThrows(
            throw_diameter = throw_diameter,
            $fn = $fn
        );
        
    }
}

/**
 * @stl
 * @png
 * @colorscheme BeforeDawn
 * @view axes,scales
 */
screenFramePiece();
